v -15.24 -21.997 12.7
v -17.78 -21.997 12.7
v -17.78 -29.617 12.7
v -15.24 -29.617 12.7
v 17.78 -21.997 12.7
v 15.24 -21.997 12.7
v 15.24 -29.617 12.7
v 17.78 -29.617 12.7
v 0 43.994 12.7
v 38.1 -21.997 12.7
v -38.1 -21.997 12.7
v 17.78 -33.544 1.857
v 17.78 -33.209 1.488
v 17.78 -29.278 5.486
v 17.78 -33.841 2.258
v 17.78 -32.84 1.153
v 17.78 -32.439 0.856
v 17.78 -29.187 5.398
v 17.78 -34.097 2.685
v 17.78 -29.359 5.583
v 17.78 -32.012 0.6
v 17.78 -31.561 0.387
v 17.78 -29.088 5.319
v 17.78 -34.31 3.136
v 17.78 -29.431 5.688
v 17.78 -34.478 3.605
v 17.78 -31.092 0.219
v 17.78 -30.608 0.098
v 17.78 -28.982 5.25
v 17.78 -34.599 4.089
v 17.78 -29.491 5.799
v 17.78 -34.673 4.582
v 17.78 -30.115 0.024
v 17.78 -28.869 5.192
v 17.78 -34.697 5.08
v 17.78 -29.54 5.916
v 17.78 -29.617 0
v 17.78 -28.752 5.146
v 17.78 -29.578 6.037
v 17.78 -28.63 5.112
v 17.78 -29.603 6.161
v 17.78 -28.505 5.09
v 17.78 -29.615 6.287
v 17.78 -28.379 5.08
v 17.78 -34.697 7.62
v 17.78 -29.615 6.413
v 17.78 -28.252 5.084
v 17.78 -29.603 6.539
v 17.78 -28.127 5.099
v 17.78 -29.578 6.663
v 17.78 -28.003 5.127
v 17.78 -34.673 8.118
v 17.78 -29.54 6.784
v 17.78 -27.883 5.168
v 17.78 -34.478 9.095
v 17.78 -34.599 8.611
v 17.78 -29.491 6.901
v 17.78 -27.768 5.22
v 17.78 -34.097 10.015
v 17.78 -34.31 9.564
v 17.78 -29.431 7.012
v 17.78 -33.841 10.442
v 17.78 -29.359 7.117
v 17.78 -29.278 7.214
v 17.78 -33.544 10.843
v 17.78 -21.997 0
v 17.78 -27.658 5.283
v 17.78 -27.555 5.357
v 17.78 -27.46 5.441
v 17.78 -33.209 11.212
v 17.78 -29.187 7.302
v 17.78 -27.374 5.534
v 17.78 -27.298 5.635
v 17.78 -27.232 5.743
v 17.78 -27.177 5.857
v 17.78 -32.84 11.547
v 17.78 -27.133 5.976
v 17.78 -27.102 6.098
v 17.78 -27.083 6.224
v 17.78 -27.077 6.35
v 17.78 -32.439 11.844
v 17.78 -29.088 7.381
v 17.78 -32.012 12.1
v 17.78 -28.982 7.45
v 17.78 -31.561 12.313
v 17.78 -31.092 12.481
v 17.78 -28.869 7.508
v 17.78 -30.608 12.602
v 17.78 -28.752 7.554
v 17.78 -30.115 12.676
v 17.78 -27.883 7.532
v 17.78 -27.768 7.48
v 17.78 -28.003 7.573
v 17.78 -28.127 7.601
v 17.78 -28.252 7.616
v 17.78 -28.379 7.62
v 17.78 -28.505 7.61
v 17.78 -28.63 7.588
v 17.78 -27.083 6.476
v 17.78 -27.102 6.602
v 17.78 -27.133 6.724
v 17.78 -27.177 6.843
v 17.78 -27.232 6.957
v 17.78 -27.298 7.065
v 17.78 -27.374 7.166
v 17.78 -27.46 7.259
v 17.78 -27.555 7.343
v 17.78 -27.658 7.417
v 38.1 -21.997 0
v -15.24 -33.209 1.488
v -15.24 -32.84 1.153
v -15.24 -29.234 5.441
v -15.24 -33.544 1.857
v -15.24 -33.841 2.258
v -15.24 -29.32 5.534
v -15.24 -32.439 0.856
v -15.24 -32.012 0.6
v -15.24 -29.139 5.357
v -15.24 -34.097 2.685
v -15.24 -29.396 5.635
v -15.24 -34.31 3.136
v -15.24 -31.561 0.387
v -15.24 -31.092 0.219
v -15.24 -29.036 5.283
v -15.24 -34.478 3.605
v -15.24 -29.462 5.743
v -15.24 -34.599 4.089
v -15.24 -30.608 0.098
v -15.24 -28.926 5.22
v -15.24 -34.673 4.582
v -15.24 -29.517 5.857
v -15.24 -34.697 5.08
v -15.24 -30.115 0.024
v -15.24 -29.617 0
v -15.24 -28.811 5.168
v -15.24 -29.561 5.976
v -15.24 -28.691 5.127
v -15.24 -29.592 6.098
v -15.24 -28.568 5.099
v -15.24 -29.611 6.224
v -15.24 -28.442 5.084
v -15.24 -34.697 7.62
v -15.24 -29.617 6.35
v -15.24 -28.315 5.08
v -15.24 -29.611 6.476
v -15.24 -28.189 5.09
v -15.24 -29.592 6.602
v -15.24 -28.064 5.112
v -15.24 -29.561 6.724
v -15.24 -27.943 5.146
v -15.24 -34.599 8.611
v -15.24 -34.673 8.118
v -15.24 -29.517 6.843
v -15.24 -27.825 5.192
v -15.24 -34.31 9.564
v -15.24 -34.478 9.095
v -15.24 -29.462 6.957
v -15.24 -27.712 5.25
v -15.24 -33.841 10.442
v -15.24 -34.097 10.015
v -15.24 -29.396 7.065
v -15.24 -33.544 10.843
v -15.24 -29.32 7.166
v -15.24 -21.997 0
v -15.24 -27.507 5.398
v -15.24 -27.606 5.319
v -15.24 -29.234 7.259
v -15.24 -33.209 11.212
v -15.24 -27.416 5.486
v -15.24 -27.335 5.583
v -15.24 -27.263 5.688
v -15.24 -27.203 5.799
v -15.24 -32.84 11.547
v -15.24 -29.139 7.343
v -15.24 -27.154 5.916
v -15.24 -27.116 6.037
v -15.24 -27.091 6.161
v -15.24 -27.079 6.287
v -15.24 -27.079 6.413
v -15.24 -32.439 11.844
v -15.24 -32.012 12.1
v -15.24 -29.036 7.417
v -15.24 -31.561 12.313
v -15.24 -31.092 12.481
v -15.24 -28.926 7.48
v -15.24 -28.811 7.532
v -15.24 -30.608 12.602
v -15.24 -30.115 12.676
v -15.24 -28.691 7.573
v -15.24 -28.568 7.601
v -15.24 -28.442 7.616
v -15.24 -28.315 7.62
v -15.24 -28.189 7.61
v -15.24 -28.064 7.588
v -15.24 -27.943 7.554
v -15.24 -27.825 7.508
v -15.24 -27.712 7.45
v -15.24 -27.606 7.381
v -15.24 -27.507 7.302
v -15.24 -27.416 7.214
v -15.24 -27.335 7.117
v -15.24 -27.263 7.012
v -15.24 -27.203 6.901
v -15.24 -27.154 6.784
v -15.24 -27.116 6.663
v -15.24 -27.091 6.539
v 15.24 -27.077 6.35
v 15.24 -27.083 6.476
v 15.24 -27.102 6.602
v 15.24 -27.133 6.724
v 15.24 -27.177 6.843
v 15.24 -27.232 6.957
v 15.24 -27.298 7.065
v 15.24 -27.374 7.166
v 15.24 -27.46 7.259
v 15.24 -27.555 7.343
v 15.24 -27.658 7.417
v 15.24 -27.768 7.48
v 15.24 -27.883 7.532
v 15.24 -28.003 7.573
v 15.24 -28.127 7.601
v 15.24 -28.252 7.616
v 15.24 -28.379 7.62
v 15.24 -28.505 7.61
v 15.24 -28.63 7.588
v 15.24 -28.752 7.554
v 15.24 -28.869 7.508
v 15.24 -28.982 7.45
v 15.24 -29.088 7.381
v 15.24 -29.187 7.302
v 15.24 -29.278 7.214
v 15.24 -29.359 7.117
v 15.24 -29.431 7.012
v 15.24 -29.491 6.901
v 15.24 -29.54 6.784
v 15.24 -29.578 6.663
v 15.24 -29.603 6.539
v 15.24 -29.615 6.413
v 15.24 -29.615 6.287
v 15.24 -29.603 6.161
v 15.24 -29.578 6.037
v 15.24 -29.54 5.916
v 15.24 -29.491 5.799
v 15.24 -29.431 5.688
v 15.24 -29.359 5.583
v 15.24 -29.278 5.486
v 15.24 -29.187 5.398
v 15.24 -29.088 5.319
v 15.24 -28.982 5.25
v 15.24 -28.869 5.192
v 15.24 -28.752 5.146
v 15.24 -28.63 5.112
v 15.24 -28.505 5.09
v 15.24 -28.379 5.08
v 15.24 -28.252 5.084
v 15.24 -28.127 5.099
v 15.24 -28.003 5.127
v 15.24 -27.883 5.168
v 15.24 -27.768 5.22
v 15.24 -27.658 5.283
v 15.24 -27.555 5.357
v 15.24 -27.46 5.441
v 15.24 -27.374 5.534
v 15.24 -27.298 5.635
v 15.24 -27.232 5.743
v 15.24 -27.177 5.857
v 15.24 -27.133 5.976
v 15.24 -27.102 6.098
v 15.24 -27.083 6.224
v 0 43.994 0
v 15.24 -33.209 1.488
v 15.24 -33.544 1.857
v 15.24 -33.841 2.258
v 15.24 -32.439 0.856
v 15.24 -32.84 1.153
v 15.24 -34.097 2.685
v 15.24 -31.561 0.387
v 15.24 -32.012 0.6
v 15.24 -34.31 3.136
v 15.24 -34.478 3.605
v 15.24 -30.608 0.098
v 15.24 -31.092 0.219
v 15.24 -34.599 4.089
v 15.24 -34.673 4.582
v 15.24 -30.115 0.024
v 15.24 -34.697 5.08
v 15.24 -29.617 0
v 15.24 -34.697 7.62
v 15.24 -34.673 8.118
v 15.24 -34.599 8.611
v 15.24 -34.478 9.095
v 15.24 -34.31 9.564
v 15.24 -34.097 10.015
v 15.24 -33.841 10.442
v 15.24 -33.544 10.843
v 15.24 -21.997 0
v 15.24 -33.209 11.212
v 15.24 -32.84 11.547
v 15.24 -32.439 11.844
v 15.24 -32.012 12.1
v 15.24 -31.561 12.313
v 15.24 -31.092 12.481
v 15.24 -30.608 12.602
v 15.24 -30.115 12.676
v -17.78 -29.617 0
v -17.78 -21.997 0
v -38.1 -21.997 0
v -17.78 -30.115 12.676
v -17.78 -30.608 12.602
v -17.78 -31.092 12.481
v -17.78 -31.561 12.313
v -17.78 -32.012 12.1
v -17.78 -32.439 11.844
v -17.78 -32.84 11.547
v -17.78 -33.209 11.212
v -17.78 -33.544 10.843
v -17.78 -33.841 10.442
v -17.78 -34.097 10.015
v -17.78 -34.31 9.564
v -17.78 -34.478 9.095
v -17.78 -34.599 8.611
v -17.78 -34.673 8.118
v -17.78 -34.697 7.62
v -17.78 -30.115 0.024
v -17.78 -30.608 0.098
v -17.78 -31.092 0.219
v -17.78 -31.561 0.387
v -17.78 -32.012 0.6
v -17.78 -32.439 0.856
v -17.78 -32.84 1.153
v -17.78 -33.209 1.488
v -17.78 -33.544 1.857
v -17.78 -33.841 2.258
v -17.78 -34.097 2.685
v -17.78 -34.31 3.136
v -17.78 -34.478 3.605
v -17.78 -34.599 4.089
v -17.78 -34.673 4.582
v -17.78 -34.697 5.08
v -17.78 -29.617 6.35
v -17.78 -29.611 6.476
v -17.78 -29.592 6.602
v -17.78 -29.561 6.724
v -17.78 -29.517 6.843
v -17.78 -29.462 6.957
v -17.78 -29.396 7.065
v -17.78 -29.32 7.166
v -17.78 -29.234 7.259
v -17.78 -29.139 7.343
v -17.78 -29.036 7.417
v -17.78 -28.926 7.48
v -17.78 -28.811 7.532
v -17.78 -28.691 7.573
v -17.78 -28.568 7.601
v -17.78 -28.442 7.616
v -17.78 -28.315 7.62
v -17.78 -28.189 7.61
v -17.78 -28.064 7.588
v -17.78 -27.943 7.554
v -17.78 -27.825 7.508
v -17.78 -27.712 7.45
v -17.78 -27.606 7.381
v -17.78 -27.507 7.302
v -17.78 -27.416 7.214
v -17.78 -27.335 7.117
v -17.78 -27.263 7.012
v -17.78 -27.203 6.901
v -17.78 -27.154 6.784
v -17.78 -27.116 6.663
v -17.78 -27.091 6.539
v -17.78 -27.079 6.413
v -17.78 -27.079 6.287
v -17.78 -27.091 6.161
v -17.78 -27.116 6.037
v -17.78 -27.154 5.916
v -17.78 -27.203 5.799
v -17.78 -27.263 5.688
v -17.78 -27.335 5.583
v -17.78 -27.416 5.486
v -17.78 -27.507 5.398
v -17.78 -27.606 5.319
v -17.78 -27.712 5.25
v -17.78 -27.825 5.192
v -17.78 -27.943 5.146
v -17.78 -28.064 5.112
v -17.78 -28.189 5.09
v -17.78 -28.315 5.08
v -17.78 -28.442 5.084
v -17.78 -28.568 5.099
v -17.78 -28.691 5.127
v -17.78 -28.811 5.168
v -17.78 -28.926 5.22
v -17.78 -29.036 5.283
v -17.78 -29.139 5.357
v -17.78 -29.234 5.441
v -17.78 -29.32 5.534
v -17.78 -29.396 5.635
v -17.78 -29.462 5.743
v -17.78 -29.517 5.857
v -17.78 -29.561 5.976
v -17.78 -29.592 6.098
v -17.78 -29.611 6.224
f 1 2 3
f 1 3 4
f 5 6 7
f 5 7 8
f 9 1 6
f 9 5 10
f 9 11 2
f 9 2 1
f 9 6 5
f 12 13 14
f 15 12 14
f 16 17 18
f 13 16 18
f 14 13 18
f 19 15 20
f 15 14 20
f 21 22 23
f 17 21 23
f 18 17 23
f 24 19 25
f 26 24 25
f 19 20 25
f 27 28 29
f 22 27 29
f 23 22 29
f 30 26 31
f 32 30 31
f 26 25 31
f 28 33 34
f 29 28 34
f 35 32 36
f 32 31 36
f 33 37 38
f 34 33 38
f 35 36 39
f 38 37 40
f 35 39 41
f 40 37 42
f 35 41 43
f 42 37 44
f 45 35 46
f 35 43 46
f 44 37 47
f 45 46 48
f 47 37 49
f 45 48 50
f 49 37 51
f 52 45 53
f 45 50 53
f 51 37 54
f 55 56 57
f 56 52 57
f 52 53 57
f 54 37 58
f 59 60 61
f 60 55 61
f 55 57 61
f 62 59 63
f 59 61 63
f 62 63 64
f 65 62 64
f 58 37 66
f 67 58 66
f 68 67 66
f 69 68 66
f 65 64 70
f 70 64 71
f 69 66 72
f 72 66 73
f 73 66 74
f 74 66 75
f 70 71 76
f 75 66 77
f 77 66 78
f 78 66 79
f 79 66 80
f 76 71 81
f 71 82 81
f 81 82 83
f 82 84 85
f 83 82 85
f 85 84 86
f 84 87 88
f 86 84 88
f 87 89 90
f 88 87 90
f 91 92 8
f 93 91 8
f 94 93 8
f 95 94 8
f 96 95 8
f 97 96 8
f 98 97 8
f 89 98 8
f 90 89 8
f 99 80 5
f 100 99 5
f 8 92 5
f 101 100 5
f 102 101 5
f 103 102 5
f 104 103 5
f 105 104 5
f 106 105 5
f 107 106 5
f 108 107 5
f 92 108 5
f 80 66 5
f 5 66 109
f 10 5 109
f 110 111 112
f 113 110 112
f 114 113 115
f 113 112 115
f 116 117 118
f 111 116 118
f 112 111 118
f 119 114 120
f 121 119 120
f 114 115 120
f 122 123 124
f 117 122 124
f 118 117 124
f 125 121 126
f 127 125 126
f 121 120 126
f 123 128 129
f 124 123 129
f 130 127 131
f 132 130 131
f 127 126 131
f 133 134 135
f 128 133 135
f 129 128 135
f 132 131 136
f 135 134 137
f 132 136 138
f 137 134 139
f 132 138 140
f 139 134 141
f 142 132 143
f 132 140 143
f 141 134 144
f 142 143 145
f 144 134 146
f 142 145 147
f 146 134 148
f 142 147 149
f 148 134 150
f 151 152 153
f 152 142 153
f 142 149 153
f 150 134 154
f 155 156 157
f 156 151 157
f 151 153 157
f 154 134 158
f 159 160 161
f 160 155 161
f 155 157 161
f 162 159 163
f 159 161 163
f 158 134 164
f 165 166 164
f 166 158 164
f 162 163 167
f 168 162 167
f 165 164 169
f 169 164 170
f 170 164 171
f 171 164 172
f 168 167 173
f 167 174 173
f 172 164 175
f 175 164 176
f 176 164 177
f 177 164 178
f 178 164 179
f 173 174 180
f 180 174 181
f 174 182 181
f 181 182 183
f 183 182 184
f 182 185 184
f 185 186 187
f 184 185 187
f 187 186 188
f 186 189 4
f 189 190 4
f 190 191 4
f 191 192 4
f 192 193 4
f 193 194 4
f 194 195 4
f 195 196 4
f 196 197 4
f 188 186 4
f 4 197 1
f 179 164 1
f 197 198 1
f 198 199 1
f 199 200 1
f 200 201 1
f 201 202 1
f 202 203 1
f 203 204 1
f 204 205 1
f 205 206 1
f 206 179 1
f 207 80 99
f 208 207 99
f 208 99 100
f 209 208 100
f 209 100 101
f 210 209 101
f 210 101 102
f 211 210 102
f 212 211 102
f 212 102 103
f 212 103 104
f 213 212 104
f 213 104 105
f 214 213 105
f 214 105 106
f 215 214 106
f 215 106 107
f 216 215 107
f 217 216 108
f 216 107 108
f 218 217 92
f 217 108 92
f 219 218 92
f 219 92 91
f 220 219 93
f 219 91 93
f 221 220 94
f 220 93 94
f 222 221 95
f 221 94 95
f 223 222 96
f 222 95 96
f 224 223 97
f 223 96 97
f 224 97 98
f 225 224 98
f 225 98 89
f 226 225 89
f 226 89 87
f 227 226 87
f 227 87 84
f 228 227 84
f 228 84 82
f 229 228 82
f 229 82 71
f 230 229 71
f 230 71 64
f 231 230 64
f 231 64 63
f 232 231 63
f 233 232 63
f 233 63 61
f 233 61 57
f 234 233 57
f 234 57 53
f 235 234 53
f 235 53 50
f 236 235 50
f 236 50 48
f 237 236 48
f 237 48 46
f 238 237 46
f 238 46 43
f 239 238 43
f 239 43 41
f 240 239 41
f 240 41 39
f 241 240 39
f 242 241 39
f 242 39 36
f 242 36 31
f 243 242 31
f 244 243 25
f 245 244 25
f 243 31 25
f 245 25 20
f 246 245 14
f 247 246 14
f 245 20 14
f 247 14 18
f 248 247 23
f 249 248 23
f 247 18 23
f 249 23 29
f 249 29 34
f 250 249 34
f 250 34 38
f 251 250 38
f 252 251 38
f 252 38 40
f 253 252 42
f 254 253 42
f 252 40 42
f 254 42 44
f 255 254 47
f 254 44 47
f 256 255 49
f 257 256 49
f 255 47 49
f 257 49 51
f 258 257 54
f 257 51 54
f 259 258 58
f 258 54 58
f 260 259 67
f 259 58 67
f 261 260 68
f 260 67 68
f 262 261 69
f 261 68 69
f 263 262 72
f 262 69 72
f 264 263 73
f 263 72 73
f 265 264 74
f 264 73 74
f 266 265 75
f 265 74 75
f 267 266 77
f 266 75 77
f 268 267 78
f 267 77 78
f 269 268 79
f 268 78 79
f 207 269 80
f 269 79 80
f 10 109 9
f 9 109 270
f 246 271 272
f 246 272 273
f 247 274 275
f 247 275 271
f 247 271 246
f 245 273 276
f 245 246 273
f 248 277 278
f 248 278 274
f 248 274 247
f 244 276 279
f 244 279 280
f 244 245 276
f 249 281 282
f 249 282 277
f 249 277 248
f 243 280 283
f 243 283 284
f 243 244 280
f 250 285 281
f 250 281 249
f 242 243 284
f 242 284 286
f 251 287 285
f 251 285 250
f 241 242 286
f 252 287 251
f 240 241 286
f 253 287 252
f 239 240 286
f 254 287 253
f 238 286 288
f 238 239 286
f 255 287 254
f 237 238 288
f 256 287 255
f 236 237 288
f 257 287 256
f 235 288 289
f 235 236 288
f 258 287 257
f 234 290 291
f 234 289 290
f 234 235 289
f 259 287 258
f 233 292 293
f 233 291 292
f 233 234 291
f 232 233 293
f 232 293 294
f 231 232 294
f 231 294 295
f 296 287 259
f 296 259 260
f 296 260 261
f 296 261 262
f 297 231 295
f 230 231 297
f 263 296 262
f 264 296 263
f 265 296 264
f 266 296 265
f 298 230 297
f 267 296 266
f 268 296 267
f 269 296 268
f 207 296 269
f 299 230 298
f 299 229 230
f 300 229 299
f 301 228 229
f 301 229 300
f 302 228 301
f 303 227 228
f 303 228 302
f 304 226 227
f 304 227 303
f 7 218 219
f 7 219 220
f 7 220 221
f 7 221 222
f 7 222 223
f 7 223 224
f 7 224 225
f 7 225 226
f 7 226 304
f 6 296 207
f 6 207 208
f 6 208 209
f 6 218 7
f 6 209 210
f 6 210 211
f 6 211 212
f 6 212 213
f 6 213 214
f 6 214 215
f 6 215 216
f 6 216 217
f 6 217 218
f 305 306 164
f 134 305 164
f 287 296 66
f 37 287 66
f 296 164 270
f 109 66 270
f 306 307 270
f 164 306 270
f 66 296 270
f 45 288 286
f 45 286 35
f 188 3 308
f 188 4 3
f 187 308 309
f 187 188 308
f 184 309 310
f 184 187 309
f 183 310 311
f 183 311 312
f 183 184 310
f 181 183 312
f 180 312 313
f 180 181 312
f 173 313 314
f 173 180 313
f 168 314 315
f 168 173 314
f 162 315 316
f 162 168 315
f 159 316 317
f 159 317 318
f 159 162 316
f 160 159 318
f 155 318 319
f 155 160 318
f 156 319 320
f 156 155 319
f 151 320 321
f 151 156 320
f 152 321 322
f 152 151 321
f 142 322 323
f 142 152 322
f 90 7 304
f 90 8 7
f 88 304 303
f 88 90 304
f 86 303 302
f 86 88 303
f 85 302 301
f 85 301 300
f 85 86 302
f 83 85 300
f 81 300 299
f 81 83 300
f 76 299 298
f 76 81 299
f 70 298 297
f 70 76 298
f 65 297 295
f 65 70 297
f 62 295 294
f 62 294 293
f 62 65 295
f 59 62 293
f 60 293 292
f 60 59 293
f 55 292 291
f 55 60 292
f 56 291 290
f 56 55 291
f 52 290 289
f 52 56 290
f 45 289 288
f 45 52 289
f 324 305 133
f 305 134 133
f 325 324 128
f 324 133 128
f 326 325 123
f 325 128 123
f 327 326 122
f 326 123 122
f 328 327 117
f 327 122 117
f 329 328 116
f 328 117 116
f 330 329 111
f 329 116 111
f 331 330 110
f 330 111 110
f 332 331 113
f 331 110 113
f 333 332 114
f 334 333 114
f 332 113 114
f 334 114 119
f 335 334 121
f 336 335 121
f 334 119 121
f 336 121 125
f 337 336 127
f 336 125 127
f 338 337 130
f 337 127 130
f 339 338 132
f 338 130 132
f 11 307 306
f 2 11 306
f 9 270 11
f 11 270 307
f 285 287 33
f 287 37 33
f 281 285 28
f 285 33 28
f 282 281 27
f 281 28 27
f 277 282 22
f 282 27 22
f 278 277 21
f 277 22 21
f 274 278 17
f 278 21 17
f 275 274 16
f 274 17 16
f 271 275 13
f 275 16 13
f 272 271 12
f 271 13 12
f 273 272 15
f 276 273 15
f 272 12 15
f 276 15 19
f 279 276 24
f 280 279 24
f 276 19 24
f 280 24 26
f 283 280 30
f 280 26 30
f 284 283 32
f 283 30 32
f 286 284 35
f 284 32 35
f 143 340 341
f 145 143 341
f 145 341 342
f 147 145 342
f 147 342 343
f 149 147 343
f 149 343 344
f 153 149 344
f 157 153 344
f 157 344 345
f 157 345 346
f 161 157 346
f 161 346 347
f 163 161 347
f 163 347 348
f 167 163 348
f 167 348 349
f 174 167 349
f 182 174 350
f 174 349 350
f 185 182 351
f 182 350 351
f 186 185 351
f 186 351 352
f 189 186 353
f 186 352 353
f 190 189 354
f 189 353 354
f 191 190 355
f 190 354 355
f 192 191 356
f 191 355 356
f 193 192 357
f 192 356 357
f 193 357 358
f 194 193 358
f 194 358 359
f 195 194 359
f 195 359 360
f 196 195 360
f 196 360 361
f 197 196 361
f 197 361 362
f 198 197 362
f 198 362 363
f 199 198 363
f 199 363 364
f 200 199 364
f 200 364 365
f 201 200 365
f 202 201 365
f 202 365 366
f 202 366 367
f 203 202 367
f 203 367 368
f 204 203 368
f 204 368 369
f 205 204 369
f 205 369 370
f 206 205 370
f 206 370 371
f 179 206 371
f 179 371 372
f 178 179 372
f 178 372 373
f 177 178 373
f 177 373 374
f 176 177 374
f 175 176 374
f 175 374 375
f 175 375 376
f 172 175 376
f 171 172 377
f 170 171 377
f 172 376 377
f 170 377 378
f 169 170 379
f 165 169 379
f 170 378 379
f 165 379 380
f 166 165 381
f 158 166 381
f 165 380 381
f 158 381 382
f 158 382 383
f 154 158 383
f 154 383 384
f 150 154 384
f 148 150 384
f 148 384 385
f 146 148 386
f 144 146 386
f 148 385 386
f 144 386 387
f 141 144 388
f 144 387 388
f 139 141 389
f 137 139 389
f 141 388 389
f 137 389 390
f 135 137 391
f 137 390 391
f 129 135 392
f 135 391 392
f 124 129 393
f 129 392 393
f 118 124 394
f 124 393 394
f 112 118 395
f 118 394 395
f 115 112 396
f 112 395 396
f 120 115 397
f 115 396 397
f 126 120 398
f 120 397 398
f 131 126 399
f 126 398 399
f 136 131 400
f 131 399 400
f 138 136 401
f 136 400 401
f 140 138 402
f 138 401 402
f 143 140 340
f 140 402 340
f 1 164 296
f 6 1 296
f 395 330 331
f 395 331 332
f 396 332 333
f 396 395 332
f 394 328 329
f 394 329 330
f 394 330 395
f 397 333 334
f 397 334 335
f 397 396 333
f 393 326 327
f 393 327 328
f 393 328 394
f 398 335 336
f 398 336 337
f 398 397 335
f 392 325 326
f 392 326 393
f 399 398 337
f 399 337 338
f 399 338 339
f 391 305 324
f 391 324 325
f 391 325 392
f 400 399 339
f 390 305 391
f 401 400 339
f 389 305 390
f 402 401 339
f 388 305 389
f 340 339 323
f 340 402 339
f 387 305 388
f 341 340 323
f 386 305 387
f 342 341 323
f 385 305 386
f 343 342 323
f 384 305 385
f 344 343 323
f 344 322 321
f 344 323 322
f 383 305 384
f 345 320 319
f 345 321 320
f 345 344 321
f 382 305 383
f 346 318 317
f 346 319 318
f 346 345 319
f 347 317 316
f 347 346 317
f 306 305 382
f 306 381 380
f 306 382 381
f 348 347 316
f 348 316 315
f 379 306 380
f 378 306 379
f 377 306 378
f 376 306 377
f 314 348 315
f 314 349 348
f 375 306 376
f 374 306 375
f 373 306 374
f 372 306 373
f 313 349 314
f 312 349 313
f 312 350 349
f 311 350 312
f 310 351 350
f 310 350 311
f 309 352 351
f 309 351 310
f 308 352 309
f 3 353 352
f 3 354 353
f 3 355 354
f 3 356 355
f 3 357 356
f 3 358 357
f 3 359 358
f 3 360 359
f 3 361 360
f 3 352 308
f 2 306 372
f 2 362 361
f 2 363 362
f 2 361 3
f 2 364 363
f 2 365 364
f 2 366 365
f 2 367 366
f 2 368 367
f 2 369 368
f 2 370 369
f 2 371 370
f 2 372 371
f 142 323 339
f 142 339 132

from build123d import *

# Parameters (mm, degrees)
F1_DEPTH = 12.7
F2_W     = 2.54
F2_H     = 12.7
F3_DEPTH = 12.7
F4_R     = 1.27
F5_DEPTH = 25.4
F6_R     = 1.27
F7_DEPTH = 25.4
F8_R     = 5.08


with BuildPart() as f1:
    # F0 (on Top) → F1 (new body)
    with BuildSketch(Plane.XY):
        Polygon((-38.1, -21.997045), (38.1, -21.997045), (0, 43.994091), align=None)
    extrude(amount=F1_DEPTH)

    # F2 (on face) → F3 (join)
    with BuildSketch(Plane.XZ.offset(21.997045)):
        with Locations((-16.51, 6.35)):
            Rectangle(F2_W, F2_H)
        with Locations((16.51, 6.35)):
            Rectangle(F2_W, F2_H)
    extrude(amount=F3_DEPTH)

    # F4 (on face) → F5 (cut)
    with BuildSketch(Plane.YZ.offset(17.78)):
        with Locations((-28.347045, 6.35)):
            Circle(F4_R)
    extrude(amount=-F5_DEPTH, mode=Mode.SUBTRACT)

    # F6 (on face) → F7 (cut)
    with BuildSketch(Plane(origin=(-17.78, 0, 0), x_dir=(0, -1, 0), z_dir=(-1, 0, 0))):
        with Locations((28.347045, 6.35)):
            Circle(F6_R)
    extrude(amount=-F7_DEPTH, mode=Mode.SUBTRACT)

    # F8
    f8_edges = [f1.edges().sort_by_distance(p)[0] for p in [
        (-16.51, -34.697045, 12.7),
        (-16.51, -34.697045, 0),
        (16.51, -34.697045, 0),
        (16.51, -34.697045, 12.7),
    ]]
    fillet(f8_edges, radius=F8_R)


solid = f1.part
